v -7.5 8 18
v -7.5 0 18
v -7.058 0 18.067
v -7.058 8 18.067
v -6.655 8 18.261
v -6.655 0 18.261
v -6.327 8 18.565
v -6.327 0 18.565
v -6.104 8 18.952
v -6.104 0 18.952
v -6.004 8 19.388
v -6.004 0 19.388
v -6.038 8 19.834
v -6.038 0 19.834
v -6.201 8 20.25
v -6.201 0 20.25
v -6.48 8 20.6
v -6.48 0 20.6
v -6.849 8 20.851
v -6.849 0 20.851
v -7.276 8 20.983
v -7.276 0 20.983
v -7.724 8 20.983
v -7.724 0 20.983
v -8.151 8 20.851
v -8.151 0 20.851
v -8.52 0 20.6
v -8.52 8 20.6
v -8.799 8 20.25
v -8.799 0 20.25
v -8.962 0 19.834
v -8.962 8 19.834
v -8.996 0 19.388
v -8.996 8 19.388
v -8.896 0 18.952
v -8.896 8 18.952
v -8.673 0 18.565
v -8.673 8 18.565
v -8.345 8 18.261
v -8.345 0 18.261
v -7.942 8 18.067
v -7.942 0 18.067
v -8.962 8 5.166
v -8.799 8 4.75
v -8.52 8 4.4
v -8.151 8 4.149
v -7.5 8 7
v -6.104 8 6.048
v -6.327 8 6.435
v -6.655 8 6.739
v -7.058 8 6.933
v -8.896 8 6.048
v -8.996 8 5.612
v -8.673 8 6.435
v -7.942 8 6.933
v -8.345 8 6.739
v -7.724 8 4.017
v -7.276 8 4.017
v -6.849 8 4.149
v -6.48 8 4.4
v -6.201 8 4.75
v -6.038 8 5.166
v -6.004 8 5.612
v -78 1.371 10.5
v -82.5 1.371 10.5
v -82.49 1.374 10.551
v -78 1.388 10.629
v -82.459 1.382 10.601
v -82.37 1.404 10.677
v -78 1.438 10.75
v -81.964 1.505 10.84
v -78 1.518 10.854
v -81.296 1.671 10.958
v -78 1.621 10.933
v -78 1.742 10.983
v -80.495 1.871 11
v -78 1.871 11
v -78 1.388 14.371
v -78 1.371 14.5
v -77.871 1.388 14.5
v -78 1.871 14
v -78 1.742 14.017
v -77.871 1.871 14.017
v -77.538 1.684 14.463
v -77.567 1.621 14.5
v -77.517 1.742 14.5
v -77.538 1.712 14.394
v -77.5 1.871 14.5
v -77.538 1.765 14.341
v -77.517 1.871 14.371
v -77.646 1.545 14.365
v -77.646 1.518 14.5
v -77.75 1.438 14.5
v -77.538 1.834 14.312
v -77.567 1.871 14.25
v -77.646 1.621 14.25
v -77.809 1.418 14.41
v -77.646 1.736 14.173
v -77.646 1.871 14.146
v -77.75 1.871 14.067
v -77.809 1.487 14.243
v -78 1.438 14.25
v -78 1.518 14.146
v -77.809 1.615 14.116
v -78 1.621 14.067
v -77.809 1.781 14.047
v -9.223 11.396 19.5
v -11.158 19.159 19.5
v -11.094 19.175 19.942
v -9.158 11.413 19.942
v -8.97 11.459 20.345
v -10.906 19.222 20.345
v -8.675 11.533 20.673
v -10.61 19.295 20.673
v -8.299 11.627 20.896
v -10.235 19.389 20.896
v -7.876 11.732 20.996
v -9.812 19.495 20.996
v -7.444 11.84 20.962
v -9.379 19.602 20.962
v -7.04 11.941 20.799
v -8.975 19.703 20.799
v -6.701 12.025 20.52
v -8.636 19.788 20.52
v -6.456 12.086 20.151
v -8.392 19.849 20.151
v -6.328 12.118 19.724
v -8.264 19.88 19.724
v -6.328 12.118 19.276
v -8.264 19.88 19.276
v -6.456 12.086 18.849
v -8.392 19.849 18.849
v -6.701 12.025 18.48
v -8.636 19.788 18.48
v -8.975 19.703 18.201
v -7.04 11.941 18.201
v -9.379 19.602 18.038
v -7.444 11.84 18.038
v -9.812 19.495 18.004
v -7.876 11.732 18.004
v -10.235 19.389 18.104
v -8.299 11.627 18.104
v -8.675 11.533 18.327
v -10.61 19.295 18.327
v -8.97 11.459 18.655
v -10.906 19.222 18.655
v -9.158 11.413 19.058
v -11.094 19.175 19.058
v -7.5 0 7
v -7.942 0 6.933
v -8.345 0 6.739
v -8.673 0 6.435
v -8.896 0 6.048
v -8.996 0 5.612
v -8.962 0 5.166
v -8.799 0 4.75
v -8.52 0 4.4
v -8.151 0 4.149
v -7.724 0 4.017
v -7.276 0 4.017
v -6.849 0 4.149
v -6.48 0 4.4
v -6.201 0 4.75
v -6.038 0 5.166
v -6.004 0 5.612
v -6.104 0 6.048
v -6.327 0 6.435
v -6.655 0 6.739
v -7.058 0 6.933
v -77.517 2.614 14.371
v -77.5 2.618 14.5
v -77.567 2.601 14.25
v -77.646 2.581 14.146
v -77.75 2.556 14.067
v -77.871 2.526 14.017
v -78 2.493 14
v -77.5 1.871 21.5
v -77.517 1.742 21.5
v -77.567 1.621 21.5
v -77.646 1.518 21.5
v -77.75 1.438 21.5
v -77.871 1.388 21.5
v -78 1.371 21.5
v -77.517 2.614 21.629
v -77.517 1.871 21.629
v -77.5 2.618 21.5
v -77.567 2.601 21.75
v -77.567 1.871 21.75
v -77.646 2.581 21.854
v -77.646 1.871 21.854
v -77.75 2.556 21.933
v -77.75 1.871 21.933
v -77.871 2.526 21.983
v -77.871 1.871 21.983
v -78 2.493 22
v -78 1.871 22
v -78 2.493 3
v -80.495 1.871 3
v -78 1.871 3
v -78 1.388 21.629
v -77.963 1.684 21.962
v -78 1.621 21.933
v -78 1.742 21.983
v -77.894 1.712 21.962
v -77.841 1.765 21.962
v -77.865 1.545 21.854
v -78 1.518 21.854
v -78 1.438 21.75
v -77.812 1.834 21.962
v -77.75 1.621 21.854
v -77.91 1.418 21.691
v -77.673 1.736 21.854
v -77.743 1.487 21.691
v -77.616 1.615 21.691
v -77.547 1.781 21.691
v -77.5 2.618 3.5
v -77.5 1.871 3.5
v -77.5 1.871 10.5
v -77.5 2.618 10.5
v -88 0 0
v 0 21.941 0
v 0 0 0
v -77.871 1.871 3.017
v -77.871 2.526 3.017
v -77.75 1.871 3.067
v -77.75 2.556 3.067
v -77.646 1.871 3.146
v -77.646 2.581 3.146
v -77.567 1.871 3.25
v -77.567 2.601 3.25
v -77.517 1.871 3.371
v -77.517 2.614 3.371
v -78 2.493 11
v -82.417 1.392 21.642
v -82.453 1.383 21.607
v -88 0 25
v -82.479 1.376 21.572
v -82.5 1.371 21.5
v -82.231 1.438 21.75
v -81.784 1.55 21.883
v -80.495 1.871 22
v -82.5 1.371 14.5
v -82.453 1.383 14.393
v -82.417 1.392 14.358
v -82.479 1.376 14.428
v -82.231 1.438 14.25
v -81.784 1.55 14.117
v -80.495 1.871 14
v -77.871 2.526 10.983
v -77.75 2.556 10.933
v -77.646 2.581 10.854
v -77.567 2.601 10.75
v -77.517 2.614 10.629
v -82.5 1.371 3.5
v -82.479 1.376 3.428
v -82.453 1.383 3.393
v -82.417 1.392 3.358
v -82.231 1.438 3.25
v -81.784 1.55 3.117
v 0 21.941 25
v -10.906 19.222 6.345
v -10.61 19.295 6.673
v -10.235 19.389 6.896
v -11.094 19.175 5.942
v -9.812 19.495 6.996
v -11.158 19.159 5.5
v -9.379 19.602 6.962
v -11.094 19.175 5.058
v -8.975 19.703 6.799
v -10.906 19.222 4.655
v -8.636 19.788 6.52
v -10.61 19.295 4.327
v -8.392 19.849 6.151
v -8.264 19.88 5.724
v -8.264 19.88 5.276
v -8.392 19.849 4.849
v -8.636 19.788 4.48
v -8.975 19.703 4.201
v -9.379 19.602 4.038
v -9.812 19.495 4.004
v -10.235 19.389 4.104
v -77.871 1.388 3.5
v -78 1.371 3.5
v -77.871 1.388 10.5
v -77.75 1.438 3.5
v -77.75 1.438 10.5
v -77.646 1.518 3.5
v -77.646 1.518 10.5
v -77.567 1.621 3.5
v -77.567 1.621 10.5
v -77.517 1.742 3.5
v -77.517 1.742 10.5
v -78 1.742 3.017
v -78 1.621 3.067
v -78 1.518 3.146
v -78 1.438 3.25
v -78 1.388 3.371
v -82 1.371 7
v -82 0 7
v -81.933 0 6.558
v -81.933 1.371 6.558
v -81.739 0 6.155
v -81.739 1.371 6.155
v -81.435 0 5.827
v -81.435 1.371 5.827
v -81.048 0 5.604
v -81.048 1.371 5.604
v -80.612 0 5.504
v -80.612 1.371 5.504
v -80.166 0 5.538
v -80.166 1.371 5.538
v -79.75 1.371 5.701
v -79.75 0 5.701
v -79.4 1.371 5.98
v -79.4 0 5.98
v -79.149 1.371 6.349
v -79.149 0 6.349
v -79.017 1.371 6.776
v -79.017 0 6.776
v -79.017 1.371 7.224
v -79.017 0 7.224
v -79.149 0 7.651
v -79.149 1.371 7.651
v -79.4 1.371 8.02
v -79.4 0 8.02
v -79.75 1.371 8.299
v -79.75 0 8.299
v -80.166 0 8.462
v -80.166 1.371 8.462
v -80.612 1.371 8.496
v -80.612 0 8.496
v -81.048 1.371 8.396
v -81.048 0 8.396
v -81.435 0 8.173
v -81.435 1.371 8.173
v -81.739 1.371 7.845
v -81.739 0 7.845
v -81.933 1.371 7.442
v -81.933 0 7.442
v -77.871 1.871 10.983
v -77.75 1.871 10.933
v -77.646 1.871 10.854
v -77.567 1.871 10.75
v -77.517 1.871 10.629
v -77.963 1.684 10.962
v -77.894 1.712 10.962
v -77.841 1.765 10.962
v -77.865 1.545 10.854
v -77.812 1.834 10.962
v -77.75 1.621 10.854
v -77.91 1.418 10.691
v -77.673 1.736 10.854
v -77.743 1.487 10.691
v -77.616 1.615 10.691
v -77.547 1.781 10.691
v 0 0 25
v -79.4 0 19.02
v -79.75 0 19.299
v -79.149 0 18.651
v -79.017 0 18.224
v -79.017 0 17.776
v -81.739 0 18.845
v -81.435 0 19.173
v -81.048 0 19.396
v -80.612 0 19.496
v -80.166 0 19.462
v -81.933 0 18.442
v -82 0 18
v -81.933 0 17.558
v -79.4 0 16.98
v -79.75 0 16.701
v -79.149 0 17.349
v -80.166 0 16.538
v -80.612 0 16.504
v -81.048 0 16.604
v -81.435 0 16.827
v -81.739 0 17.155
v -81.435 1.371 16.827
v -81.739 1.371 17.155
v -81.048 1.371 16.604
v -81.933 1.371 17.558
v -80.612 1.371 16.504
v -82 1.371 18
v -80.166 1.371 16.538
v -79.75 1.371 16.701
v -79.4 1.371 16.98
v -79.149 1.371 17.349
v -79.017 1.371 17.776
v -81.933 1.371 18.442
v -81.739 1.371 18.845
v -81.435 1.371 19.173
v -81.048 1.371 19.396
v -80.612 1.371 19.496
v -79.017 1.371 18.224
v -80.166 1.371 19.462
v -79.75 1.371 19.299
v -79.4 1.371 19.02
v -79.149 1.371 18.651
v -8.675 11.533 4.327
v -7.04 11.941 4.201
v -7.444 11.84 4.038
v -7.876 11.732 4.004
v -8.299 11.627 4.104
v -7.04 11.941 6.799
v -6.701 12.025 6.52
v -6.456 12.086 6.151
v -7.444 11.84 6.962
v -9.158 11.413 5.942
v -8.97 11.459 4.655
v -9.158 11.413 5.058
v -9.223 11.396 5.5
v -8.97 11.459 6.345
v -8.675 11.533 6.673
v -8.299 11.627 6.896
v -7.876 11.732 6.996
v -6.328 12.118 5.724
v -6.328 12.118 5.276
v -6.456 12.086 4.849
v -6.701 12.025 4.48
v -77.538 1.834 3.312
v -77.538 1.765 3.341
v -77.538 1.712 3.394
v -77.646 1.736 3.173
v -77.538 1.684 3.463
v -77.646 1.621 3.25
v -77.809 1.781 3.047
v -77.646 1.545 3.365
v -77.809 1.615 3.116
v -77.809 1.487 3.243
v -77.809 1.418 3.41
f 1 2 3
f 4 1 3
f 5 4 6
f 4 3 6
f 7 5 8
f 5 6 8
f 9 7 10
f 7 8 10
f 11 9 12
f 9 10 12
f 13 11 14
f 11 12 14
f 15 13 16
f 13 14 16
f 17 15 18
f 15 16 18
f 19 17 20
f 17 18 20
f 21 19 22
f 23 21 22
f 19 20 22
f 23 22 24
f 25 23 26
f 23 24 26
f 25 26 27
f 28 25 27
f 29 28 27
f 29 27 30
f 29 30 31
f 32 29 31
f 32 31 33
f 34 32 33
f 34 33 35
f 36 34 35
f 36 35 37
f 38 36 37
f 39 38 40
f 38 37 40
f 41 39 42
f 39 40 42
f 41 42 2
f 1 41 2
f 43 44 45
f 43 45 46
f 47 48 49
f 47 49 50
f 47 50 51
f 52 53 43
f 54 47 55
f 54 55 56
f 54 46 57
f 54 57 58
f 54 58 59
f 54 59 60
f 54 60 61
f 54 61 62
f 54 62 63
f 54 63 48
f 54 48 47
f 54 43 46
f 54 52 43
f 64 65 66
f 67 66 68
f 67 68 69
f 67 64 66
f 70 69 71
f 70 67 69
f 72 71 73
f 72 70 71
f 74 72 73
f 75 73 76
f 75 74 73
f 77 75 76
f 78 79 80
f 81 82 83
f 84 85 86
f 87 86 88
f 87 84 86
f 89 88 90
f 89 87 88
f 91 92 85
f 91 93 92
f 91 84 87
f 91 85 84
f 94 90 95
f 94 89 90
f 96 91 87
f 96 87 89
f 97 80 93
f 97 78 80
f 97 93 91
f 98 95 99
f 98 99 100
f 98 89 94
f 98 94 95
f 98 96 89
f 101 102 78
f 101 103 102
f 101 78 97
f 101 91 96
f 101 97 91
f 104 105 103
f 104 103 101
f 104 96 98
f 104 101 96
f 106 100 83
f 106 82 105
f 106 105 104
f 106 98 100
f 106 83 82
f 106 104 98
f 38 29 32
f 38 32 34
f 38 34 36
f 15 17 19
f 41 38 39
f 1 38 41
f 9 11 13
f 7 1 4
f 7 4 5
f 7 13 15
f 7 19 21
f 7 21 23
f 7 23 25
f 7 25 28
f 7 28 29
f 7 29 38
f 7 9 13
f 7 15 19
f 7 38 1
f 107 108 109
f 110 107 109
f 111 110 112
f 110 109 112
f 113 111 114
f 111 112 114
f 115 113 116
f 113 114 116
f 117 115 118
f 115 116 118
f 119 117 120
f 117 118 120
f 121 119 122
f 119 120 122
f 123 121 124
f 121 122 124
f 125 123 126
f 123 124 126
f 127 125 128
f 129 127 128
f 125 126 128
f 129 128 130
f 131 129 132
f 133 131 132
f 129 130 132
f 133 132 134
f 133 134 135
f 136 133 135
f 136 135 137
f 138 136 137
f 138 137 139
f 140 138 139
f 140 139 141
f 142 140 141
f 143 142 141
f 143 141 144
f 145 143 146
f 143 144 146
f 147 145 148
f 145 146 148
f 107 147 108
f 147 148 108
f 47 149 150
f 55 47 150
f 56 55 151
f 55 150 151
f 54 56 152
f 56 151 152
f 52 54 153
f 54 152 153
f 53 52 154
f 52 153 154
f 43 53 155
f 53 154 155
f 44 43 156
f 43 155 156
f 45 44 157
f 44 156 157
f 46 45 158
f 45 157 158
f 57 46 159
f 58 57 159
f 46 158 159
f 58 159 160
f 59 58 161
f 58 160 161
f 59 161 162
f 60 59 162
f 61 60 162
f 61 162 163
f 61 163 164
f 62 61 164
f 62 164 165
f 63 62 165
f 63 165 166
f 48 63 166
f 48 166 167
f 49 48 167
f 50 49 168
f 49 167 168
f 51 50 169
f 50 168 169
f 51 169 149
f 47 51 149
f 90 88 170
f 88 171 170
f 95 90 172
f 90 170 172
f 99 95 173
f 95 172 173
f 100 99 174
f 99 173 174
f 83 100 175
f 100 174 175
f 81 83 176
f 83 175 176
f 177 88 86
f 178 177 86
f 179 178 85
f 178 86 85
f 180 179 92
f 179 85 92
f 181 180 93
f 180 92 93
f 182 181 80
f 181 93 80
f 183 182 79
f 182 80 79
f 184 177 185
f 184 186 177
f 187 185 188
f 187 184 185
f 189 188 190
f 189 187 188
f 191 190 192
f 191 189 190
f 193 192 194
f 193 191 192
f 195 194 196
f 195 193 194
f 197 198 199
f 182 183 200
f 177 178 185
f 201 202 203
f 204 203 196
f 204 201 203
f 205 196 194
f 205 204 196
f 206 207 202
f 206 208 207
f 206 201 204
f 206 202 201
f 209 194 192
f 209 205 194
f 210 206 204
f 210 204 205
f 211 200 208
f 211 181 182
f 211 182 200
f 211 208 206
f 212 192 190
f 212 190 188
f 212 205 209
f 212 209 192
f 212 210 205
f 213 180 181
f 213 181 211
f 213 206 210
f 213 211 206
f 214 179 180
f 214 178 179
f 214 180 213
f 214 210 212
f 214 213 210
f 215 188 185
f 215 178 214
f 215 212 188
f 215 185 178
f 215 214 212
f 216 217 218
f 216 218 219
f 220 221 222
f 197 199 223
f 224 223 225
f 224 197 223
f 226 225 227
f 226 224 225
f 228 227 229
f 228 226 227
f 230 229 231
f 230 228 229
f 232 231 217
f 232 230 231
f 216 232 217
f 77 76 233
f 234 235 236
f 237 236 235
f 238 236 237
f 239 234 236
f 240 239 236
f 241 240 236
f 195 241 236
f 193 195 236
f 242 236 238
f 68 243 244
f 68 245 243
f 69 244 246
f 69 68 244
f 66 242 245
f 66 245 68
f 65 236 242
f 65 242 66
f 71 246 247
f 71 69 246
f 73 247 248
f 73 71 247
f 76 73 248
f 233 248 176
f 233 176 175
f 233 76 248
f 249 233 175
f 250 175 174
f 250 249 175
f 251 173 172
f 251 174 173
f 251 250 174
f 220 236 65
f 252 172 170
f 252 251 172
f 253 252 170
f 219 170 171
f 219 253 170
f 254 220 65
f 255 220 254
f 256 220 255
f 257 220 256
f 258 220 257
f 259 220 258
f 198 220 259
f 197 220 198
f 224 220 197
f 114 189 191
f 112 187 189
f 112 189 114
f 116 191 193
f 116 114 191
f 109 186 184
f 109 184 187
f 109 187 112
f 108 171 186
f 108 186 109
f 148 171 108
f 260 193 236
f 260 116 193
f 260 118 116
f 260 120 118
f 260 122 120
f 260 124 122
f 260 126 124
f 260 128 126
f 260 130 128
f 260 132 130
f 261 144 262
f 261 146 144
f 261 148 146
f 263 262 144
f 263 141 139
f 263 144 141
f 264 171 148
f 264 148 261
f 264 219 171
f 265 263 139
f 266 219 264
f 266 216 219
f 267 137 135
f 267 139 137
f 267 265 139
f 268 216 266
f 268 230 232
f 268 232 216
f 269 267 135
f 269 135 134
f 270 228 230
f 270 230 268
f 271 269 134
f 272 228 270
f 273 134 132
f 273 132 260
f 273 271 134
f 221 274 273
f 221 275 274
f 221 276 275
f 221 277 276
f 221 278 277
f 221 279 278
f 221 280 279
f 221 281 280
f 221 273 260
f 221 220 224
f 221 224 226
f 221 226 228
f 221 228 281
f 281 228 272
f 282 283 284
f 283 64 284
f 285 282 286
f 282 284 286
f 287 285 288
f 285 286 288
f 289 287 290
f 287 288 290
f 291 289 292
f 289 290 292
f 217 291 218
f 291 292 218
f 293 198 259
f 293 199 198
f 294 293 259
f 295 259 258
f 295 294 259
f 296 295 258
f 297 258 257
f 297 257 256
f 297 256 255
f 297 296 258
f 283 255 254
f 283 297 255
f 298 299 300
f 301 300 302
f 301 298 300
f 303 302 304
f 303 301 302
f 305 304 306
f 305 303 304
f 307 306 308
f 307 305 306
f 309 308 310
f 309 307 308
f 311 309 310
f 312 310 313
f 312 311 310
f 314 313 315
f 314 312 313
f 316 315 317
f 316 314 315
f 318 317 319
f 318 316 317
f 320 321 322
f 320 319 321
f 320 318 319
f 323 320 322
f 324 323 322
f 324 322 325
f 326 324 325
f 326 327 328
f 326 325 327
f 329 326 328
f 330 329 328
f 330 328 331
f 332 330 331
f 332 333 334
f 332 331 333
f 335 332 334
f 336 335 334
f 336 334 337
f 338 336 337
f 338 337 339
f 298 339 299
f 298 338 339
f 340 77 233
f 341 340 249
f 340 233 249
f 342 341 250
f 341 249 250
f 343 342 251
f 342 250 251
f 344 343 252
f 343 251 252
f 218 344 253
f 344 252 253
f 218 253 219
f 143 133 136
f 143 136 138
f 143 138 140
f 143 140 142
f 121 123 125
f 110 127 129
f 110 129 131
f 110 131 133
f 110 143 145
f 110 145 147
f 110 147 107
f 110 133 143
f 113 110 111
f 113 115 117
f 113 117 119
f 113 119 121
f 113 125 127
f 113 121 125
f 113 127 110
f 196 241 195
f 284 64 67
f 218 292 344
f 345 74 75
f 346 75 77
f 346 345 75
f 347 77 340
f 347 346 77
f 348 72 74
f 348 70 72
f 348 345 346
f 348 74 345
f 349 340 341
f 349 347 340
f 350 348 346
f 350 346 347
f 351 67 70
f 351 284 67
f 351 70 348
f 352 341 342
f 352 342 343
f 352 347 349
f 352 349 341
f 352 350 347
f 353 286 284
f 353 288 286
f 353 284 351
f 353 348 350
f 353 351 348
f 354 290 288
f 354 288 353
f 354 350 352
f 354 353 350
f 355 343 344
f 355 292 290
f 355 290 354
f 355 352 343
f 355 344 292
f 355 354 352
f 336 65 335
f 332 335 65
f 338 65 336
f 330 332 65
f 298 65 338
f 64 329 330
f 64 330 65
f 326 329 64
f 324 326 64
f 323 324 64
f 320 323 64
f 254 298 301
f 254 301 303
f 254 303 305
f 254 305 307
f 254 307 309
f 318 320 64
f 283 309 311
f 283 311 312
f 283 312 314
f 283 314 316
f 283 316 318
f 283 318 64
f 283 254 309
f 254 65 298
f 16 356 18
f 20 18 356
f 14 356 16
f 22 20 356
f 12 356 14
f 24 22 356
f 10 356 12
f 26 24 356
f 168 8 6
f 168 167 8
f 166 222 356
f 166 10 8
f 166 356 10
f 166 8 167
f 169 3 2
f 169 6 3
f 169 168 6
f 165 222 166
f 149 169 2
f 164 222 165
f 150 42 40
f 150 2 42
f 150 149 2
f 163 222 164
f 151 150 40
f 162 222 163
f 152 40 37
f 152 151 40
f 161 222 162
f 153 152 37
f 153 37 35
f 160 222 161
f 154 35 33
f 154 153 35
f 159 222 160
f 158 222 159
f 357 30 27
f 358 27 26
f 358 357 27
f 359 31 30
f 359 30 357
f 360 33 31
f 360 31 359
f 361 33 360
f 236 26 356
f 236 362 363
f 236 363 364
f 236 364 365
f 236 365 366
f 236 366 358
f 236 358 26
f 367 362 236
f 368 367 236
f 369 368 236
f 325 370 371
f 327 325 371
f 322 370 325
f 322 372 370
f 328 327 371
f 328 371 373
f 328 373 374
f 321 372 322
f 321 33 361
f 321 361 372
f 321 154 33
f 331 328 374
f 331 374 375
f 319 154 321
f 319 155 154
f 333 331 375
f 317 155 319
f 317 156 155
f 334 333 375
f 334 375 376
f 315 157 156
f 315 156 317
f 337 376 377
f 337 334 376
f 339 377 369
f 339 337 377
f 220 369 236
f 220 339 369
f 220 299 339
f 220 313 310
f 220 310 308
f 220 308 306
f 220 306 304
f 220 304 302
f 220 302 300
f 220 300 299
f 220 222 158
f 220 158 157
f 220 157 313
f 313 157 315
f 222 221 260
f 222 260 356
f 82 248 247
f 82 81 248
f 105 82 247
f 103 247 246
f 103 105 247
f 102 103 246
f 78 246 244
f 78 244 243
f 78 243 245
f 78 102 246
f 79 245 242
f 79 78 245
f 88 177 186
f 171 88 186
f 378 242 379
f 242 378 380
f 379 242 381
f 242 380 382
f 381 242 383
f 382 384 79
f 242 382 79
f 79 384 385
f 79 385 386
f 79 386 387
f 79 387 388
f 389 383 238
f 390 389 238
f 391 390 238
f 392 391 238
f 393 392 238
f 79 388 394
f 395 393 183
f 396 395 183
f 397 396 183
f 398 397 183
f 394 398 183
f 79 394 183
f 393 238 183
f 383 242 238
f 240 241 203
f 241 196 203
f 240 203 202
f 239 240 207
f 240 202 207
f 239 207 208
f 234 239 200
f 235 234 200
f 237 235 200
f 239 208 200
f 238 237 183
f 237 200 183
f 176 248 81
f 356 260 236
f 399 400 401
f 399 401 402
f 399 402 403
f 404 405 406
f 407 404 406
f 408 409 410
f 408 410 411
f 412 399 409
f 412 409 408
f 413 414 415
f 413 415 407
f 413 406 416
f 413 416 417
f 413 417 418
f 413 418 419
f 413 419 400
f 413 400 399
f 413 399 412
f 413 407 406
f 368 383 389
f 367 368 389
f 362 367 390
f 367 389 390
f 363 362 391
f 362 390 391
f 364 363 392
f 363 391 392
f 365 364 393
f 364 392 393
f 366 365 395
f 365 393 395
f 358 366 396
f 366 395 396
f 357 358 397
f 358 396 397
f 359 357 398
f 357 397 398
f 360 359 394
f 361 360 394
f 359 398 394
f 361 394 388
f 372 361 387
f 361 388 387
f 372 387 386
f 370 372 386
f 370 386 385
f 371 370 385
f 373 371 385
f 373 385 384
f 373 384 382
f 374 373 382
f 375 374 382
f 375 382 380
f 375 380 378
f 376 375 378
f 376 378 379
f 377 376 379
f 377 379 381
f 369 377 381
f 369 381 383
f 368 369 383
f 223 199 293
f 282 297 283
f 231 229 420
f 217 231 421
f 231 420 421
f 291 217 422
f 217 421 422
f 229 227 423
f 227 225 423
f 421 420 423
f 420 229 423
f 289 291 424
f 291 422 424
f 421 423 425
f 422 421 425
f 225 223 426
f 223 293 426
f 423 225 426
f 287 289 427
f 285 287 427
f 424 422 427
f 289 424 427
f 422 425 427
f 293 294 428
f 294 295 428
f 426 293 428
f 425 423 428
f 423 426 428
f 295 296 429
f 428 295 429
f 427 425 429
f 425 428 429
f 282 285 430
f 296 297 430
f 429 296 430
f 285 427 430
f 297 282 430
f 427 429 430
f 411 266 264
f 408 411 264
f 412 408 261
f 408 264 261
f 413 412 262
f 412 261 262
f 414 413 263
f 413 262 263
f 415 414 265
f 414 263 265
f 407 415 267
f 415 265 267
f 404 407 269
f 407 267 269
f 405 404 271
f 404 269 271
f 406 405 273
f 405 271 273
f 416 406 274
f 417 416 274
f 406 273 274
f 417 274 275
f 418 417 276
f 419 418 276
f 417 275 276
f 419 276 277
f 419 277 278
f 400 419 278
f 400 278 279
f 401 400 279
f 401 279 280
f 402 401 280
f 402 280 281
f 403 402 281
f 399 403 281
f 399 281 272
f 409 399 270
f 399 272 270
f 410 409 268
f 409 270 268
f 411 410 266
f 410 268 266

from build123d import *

# Parameters (mm, degrees)
EXTRUDE_1_DEPTH     = 25
SKETCH_2_R          = 1.5
CUT_EXTRUDE_1_DEPTH = 8
SKETCH_3_R          = 1.5
CUT_EXTRUDE_2_DEPTH = 8
CUT_EXTRUDE_3_DEPTH = 8
SKETCH_6_R          = 1.5
CUT_EXTRUDE_4_DEPTH = 94.766234905
FILLET_1_R          = 0.5


with BuildPart() as part:
    # 草图1 → 凸台-拉伸1 (new body)
    with BuildSketch(Plane.XY):
        Polygon((0, 0), (-88, 0), (0, 21.94086425), align=None)
    extrude(amount=EXTRUDE_1_DEPTH)

    # 草图2 → 切除-拉伸1 (cut)
    with BuildSketch(Plane.XZ):
        with Locations(Location((-7.5, 19.5, 0), (0, 0, 270))):
            Circle(SKETCH_2_R)
        with Locations(Location((-7.5, 5.5, 0), (0, 0, 90))):
            Circle(SKETCH_2_R)
    extrude(amount=-CUT_EXTRUDE_1_DEPTH, mode=Mode.SUBTRACT)

    # 草图3 → 切除-拉伸2 (cut)
    with BuildSketch(Plane(origin=(-5.150305914, 20.656748763, 0), x_dir=(0.9702957262759981, 0.24192189559966132, 0), z_dir=(-0.2419218955996613, 0.970295726275998, 0))):
        with Locations(Location((-4.692024529, -5.5, 0), (0, 0, 180))):
            Circle(SKETCH_3_R)
        with Locations(Location((-4.692024529, -19.5, 0), (0, 0, 180))):
            Circle(SKETCH_3_R)
    extrude(amount=-CUT_EXTRUDE_2_DEPTH, mode=Mode.SUBTRACT)

    # 草图5 → 切除-拉伸3 (cut)
    with BuildSketch(Plane.XY.offset(22)):
        Polygon((-77.5, 1.371304016), (-77.5, 2.61794403), (-82.5, 1.371304016), align=None)
    cut_extrude_3 = extrude(amount=-CUT_EXTRUDE_3_DEPTH, mode=Mode.SUBTRACT)

    # 草图6 → 切除-拉伸4 (cut, through all)
    with BuildSketch(Plane(origin=(0, 1.371304016, 0), x_dir=(1, 0, 0), z_dir=(0, 1, 0))):
        with Locations(Location((-80.5, -18, 0), (0, 0, 180))):
            Circle(SKETCH_6_R)
    cut_extrude_4 = extrude(amount=-CUT_EXTRUDE_4_DEPTH, mode=Mode.SUBTRACT)

    # 镜向1: 切除-拉伸3, 切除-拉伸4 across plane
    add(cut_extrude_3.mirror(Plane.XY.offset(12.5)), mode=Mode.SUBTRACT)
    add(cut_extrude_4.mirror(Plane.XY.offset(12.5)), mode=Mode.SUBTRACT)

    # 圆角1
    fillet_1_edges = [part.edges().sort_by_distance(p)[0] for p in [
        (-80, 1.371304016, 14),
        (-77.5, 1.371304016, 18),
        (-77.5, 1.994624023, 14),
        (-80, 1.371304016, 22),
        (-77.5, 1.994624023, 22),
        (-80, 1.371304016, 3),
        (-77.5, 1.994624023, 3),
        (-77.5, 1.371304016, 7),
        (-80, 1.371304016, 11),
        (-77.5, 1.994624023, 11),
    ]]
    fillet(fillet_1_edges, radius=FILLET_1_R)


solid = part.part
